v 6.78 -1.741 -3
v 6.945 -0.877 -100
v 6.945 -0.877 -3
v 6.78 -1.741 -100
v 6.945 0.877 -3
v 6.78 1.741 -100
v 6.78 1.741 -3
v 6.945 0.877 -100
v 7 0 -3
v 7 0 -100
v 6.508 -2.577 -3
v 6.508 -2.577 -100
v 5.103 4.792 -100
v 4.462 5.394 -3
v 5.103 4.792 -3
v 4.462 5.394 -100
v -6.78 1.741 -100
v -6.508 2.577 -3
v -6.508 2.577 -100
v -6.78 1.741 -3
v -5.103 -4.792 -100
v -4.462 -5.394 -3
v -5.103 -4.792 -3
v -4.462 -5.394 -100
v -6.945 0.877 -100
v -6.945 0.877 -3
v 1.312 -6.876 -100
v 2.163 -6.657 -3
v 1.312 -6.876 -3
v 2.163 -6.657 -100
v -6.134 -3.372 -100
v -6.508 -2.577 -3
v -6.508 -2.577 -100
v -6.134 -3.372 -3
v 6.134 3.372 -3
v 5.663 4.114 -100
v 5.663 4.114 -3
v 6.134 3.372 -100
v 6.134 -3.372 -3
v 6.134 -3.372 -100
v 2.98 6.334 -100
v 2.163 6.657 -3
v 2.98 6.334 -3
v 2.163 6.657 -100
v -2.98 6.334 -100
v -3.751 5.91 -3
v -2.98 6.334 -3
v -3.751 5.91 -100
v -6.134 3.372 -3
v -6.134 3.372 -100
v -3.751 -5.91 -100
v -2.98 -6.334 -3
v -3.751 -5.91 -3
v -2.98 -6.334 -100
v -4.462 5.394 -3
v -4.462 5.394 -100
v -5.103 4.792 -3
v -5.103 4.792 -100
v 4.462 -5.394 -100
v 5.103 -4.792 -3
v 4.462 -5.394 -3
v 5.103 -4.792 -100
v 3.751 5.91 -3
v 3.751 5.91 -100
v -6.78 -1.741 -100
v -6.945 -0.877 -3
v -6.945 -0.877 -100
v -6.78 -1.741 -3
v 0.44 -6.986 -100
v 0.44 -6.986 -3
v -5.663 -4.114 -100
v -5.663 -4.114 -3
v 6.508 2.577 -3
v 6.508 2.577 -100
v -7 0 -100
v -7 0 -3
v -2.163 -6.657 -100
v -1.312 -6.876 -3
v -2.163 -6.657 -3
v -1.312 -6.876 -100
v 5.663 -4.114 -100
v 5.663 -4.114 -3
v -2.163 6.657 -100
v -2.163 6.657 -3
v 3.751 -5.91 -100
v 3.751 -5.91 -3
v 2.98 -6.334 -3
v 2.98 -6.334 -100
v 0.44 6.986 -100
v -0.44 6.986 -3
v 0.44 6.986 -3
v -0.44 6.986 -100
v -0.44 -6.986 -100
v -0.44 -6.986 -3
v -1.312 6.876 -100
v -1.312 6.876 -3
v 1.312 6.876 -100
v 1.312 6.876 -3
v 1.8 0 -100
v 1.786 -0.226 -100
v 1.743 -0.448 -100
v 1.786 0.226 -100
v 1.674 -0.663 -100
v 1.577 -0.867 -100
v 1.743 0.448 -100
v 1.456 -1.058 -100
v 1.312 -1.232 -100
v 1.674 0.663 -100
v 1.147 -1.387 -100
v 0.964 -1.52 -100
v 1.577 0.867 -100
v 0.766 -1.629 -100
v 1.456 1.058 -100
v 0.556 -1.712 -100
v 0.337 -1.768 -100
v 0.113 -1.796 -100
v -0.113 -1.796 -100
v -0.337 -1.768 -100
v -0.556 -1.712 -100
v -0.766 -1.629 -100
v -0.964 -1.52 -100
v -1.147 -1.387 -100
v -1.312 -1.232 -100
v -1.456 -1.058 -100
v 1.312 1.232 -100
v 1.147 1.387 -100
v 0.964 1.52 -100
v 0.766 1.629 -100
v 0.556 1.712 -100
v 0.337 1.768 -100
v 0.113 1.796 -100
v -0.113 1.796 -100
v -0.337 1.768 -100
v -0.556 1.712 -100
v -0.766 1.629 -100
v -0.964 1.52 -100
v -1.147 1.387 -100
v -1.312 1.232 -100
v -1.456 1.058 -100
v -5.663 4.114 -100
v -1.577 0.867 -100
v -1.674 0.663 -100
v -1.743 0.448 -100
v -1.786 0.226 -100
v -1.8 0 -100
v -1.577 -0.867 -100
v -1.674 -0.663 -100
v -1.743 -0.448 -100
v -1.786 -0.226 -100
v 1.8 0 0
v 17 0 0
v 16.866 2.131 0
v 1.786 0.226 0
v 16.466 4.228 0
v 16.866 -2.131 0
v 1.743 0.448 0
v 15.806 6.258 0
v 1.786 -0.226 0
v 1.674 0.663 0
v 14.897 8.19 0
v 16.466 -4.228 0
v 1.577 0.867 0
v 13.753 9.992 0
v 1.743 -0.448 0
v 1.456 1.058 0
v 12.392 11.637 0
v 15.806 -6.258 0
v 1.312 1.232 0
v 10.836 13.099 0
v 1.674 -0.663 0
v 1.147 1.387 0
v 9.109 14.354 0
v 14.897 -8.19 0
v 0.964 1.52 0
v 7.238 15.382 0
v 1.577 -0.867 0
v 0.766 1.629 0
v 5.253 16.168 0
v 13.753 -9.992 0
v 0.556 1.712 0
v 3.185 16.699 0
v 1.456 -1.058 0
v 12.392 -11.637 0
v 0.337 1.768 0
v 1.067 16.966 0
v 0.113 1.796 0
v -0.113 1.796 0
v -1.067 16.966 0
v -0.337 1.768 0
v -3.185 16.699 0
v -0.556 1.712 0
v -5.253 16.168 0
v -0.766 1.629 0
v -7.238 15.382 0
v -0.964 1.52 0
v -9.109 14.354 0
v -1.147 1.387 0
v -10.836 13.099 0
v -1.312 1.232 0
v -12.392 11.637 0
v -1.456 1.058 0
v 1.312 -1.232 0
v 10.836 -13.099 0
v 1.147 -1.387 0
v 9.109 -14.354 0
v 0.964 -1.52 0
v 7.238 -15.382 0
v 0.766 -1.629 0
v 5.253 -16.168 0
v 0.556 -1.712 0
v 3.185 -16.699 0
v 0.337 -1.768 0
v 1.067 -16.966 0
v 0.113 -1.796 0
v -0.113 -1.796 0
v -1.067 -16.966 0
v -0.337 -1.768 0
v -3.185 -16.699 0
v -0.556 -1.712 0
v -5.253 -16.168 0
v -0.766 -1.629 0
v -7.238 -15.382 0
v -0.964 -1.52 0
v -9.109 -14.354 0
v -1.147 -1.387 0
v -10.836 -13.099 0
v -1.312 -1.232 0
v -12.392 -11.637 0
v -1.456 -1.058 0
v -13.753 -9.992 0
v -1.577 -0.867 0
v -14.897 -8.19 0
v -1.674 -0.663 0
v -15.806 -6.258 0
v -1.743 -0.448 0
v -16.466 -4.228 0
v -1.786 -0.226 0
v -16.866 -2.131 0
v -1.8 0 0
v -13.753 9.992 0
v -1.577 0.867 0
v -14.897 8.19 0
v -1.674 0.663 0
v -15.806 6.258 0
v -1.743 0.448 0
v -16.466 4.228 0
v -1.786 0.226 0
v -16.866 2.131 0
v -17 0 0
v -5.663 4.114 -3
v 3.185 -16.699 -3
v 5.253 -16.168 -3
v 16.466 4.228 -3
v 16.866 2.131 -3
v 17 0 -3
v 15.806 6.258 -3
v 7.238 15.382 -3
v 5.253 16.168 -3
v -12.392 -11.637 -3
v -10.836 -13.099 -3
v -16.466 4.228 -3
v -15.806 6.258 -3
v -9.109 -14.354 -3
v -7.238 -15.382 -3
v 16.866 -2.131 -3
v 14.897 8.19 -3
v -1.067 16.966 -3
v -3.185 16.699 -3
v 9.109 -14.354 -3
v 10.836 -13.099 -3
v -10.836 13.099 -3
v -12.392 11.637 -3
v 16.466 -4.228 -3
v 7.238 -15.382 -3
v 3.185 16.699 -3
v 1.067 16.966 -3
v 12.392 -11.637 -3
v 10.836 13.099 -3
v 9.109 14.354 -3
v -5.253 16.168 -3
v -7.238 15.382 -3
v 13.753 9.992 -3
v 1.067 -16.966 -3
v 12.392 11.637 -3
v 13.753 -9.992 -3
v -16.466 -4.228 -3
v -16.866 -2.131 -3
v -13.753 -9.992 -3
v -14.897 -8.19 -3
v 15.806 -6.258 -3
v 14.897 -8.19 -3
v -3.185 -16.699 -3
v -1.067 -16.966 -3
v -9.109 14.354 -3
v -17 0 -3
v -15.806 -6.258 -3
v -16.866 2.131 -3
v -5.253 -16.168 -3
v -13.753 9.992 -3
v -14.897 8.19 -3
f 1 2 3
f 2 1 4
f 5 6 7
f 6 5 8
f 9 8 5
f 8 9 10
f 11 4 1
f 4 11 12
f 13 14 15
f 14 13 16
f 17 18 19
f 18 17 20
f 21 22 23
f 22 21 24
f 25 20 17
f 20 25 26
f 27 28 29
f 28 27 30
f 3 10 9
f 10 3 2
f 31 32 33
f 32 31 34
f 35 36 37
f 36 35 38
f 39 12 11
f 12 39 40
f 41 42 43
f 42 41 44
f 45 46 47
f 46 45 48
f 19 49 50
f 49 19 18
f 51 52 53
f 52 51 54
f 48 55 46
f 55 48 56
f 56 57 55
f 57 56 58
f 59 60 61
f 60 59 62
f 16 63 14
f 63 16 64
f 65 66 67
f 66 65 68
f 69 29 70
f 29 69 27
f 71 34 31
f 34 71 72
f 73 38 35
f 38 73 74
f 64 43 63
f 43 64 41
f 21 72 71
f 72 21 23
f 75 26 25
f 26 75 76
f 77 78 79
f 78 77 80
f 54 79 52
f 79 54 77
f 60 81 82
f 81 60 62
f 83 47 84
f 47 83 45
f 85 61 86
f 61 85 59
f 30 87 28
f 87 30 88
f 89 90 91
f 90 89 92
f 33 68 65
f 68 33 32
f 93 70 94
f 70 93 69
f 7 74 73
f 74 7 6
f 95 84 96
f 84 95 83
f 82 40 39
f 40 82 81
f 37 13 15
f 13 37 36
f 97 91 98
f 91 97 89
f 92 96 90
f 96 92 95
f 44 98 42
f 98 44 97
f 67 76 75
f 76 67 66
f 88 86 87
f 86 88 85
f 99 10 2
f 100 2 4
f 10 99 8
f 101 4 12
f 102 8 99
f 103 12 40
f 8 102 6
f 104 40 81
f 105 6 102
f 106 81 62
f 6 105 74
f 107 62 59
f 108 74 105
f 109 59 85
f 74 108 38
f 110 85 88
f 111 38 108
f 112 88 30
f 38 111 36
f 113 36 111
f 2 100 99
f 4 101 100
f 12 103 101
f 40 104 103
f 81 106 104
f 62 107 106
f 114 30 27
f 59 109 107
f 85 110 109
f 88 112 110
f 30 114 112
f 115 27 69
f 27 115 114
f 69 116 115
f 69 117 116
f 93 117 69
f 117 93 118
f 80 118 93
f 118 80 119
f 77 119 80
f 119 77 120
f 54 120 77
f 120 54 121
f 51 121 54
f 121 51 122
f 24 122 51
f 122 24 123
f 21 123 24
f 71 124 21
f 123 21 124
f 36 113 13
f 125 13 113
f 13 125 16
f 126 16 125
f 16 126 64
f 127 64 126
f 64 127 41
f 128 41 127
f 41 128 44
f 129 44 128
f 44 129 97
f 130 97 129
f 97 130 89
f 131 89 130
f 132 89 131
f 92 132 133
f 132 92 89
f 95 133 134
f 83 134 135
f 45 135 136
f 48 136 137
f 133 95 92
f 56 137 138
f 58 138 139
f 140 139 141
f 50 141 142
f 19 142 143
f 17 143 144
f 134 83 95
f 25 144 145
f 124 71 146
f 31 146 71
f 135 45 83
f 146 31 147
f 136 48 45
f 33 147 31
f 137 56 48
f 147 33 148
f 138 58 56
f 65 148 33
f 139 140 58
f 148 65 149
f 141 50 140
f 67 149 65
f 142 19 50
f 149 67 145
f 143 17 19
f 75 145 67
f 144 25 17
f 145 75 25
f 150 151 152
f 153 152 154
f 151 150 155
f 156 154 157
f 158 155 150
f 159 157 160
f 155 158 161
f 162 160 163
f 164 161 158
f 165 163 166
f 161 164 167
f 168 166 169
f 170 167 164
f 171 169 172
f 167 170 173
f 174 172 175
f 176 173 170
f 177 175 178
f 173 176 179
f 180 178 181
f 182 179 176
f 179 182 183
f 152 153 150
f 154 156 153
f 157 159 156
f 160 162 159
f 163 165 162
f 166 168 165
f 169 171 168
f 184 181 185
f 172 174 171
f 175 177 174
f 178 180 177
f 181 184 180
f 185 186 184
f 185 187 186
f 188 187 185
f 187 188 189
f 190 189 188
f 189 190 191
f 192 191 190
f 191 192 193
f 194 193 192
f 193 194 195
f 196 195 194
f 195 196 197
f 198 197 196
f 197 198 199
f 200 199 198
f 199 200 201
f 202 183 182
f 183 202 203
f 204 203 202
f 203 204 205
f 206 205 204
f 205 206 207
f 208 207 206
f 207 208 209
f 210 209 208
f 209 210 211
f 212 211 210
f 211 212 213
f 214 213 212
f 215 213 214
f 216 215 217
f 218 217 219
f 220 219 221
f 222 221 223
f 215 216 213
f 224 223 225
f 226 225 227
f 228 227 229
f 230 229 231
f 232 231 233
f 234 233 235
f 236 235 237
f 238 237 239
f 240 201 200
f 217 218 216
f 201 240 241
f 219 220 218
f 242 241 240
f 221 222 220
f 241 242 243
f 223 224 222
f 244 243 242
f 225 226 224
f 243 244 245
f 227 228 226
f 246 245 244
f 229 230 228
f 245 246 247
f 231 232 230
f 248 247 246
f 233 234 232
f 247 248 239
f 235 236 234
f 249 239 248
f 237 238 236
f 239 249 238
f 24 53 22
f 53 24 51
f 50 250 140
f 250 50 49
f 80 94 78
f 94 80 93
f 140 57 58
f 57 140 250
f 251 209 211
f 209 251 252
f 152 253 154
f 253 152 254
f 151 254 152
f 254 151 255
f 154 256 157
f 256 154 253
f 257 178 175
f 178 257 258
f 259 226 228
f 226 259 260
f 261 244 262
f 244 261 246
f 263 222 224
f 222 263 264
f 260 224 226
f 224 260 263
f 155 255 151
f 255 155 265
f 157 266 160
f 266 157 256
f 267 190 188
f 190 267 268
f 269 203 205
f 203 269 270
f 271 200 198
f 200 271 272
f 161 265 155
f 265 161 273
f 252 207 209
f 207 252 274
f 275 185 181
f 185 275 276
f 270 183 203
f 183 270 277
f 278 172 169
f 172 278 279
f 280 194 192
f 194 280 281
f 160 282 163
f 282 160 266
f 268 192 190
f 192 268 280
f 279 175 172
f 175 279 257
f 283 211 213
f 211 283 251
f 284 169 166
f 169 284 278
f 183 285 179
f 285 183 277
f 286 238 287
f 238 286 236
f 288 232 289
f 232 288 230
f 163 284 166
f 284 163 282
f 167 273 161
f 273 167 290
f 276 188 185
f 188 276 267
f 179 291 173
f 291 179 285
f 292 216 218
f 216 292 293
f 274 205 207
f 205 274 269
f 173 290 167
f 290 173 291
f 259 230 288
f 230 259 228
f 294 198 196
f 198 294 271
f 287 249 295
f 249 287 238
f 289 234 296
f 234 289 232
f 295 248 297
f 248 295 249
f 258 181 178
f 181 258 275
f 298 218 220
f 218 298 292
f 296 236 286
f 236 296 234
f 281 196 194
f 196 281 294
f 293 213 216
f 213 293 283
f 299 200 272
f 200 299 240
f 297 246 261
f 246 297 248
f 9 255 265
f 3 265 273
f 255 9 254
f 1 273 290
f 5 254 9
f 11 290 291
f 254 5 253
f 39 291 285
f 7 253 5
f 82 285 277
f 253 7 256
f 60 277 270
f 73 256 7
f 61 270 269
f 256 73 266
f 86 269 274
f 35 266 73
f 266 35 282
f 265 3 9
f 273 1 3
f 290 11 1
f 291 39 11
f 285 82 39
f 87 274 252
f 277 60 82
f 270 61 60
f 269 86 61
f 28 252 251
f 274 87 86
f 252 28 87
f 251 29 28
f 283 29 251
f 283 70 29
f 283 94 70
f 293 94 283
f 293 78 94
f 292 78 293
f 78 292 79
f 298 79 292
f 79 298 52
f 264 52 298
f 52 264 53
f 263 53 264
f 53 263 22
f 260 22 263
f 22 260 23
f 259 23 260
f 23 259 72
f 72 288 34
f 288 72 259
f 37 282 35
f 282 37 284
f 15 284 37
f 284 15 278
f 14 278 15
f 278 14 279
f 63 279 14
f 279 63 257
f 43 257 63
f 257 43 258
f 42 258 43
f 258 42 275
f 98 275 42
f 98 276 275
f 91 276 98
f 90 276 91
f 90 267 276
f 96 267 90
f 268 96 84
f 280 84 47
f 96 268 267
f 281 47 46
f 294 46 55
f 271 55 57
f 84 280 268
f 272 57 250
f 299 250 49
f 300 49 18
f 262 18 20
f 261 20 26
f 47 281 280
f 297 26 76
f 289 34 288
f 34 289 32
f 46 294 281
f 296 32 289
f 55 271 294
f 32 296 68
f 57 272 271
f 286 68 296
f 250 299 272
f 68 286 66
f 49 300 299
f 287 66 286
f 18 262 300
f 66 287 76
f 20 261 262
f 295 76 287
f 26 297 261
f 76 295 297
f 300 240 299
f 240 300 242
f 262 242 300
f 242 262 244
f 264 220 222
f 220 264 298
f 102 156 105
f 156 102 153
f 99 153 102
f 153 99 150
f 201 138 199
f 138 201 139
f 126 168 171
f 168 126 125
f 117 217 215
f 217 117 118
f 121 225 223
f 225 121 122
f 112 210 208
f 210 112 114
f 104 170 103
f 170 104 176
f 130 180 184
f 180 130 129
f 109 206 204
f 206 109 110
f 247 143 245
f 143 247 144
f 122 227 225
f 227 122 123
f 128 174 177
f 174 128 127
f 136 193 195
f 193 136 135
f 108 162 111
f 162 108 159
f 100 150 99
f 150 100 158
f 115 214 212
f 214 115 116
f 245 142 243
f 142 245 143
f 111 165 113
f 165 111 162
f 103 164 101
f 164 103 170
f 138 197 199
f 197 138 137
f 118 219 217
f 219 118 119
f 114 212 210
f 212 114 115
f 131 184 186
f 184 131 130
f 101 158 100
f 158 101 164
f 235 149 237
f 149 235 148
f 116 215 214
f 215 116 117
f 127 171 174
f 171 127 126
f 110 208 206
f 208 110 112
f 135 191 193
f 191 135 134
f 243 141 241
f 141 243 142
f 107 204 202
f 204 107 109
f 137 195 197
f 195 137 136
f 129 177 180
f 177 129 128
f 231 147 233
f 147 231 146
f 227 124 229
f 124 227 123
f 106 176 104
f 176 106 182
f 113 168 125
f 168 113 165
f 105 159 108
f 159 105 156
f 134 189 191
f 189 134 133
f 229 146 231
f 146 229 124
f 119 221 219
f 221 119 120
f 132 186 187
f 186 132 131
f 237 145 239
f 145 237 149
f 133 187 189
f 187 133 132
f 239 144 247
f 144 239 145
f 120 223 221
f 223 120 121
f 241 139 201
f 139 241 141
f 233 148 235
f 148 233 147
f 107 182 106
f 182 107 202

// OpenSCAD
$fn = 50;


difference() {
	union() {
		translate(v = [0, 0, -100.0000000000]) {
			cylinder(h = 100, r = 7.0000000000);
		}
		translate(v = [0, 0, -3.0000000000]) {
			cylinder(h = 3, r = 17.0000000000);
		}
	}
	union() {
		#translate(v = [0, 0, -100]) {
			cylinder(h = 100, r = 1.8000000000);
		}
	}
}
